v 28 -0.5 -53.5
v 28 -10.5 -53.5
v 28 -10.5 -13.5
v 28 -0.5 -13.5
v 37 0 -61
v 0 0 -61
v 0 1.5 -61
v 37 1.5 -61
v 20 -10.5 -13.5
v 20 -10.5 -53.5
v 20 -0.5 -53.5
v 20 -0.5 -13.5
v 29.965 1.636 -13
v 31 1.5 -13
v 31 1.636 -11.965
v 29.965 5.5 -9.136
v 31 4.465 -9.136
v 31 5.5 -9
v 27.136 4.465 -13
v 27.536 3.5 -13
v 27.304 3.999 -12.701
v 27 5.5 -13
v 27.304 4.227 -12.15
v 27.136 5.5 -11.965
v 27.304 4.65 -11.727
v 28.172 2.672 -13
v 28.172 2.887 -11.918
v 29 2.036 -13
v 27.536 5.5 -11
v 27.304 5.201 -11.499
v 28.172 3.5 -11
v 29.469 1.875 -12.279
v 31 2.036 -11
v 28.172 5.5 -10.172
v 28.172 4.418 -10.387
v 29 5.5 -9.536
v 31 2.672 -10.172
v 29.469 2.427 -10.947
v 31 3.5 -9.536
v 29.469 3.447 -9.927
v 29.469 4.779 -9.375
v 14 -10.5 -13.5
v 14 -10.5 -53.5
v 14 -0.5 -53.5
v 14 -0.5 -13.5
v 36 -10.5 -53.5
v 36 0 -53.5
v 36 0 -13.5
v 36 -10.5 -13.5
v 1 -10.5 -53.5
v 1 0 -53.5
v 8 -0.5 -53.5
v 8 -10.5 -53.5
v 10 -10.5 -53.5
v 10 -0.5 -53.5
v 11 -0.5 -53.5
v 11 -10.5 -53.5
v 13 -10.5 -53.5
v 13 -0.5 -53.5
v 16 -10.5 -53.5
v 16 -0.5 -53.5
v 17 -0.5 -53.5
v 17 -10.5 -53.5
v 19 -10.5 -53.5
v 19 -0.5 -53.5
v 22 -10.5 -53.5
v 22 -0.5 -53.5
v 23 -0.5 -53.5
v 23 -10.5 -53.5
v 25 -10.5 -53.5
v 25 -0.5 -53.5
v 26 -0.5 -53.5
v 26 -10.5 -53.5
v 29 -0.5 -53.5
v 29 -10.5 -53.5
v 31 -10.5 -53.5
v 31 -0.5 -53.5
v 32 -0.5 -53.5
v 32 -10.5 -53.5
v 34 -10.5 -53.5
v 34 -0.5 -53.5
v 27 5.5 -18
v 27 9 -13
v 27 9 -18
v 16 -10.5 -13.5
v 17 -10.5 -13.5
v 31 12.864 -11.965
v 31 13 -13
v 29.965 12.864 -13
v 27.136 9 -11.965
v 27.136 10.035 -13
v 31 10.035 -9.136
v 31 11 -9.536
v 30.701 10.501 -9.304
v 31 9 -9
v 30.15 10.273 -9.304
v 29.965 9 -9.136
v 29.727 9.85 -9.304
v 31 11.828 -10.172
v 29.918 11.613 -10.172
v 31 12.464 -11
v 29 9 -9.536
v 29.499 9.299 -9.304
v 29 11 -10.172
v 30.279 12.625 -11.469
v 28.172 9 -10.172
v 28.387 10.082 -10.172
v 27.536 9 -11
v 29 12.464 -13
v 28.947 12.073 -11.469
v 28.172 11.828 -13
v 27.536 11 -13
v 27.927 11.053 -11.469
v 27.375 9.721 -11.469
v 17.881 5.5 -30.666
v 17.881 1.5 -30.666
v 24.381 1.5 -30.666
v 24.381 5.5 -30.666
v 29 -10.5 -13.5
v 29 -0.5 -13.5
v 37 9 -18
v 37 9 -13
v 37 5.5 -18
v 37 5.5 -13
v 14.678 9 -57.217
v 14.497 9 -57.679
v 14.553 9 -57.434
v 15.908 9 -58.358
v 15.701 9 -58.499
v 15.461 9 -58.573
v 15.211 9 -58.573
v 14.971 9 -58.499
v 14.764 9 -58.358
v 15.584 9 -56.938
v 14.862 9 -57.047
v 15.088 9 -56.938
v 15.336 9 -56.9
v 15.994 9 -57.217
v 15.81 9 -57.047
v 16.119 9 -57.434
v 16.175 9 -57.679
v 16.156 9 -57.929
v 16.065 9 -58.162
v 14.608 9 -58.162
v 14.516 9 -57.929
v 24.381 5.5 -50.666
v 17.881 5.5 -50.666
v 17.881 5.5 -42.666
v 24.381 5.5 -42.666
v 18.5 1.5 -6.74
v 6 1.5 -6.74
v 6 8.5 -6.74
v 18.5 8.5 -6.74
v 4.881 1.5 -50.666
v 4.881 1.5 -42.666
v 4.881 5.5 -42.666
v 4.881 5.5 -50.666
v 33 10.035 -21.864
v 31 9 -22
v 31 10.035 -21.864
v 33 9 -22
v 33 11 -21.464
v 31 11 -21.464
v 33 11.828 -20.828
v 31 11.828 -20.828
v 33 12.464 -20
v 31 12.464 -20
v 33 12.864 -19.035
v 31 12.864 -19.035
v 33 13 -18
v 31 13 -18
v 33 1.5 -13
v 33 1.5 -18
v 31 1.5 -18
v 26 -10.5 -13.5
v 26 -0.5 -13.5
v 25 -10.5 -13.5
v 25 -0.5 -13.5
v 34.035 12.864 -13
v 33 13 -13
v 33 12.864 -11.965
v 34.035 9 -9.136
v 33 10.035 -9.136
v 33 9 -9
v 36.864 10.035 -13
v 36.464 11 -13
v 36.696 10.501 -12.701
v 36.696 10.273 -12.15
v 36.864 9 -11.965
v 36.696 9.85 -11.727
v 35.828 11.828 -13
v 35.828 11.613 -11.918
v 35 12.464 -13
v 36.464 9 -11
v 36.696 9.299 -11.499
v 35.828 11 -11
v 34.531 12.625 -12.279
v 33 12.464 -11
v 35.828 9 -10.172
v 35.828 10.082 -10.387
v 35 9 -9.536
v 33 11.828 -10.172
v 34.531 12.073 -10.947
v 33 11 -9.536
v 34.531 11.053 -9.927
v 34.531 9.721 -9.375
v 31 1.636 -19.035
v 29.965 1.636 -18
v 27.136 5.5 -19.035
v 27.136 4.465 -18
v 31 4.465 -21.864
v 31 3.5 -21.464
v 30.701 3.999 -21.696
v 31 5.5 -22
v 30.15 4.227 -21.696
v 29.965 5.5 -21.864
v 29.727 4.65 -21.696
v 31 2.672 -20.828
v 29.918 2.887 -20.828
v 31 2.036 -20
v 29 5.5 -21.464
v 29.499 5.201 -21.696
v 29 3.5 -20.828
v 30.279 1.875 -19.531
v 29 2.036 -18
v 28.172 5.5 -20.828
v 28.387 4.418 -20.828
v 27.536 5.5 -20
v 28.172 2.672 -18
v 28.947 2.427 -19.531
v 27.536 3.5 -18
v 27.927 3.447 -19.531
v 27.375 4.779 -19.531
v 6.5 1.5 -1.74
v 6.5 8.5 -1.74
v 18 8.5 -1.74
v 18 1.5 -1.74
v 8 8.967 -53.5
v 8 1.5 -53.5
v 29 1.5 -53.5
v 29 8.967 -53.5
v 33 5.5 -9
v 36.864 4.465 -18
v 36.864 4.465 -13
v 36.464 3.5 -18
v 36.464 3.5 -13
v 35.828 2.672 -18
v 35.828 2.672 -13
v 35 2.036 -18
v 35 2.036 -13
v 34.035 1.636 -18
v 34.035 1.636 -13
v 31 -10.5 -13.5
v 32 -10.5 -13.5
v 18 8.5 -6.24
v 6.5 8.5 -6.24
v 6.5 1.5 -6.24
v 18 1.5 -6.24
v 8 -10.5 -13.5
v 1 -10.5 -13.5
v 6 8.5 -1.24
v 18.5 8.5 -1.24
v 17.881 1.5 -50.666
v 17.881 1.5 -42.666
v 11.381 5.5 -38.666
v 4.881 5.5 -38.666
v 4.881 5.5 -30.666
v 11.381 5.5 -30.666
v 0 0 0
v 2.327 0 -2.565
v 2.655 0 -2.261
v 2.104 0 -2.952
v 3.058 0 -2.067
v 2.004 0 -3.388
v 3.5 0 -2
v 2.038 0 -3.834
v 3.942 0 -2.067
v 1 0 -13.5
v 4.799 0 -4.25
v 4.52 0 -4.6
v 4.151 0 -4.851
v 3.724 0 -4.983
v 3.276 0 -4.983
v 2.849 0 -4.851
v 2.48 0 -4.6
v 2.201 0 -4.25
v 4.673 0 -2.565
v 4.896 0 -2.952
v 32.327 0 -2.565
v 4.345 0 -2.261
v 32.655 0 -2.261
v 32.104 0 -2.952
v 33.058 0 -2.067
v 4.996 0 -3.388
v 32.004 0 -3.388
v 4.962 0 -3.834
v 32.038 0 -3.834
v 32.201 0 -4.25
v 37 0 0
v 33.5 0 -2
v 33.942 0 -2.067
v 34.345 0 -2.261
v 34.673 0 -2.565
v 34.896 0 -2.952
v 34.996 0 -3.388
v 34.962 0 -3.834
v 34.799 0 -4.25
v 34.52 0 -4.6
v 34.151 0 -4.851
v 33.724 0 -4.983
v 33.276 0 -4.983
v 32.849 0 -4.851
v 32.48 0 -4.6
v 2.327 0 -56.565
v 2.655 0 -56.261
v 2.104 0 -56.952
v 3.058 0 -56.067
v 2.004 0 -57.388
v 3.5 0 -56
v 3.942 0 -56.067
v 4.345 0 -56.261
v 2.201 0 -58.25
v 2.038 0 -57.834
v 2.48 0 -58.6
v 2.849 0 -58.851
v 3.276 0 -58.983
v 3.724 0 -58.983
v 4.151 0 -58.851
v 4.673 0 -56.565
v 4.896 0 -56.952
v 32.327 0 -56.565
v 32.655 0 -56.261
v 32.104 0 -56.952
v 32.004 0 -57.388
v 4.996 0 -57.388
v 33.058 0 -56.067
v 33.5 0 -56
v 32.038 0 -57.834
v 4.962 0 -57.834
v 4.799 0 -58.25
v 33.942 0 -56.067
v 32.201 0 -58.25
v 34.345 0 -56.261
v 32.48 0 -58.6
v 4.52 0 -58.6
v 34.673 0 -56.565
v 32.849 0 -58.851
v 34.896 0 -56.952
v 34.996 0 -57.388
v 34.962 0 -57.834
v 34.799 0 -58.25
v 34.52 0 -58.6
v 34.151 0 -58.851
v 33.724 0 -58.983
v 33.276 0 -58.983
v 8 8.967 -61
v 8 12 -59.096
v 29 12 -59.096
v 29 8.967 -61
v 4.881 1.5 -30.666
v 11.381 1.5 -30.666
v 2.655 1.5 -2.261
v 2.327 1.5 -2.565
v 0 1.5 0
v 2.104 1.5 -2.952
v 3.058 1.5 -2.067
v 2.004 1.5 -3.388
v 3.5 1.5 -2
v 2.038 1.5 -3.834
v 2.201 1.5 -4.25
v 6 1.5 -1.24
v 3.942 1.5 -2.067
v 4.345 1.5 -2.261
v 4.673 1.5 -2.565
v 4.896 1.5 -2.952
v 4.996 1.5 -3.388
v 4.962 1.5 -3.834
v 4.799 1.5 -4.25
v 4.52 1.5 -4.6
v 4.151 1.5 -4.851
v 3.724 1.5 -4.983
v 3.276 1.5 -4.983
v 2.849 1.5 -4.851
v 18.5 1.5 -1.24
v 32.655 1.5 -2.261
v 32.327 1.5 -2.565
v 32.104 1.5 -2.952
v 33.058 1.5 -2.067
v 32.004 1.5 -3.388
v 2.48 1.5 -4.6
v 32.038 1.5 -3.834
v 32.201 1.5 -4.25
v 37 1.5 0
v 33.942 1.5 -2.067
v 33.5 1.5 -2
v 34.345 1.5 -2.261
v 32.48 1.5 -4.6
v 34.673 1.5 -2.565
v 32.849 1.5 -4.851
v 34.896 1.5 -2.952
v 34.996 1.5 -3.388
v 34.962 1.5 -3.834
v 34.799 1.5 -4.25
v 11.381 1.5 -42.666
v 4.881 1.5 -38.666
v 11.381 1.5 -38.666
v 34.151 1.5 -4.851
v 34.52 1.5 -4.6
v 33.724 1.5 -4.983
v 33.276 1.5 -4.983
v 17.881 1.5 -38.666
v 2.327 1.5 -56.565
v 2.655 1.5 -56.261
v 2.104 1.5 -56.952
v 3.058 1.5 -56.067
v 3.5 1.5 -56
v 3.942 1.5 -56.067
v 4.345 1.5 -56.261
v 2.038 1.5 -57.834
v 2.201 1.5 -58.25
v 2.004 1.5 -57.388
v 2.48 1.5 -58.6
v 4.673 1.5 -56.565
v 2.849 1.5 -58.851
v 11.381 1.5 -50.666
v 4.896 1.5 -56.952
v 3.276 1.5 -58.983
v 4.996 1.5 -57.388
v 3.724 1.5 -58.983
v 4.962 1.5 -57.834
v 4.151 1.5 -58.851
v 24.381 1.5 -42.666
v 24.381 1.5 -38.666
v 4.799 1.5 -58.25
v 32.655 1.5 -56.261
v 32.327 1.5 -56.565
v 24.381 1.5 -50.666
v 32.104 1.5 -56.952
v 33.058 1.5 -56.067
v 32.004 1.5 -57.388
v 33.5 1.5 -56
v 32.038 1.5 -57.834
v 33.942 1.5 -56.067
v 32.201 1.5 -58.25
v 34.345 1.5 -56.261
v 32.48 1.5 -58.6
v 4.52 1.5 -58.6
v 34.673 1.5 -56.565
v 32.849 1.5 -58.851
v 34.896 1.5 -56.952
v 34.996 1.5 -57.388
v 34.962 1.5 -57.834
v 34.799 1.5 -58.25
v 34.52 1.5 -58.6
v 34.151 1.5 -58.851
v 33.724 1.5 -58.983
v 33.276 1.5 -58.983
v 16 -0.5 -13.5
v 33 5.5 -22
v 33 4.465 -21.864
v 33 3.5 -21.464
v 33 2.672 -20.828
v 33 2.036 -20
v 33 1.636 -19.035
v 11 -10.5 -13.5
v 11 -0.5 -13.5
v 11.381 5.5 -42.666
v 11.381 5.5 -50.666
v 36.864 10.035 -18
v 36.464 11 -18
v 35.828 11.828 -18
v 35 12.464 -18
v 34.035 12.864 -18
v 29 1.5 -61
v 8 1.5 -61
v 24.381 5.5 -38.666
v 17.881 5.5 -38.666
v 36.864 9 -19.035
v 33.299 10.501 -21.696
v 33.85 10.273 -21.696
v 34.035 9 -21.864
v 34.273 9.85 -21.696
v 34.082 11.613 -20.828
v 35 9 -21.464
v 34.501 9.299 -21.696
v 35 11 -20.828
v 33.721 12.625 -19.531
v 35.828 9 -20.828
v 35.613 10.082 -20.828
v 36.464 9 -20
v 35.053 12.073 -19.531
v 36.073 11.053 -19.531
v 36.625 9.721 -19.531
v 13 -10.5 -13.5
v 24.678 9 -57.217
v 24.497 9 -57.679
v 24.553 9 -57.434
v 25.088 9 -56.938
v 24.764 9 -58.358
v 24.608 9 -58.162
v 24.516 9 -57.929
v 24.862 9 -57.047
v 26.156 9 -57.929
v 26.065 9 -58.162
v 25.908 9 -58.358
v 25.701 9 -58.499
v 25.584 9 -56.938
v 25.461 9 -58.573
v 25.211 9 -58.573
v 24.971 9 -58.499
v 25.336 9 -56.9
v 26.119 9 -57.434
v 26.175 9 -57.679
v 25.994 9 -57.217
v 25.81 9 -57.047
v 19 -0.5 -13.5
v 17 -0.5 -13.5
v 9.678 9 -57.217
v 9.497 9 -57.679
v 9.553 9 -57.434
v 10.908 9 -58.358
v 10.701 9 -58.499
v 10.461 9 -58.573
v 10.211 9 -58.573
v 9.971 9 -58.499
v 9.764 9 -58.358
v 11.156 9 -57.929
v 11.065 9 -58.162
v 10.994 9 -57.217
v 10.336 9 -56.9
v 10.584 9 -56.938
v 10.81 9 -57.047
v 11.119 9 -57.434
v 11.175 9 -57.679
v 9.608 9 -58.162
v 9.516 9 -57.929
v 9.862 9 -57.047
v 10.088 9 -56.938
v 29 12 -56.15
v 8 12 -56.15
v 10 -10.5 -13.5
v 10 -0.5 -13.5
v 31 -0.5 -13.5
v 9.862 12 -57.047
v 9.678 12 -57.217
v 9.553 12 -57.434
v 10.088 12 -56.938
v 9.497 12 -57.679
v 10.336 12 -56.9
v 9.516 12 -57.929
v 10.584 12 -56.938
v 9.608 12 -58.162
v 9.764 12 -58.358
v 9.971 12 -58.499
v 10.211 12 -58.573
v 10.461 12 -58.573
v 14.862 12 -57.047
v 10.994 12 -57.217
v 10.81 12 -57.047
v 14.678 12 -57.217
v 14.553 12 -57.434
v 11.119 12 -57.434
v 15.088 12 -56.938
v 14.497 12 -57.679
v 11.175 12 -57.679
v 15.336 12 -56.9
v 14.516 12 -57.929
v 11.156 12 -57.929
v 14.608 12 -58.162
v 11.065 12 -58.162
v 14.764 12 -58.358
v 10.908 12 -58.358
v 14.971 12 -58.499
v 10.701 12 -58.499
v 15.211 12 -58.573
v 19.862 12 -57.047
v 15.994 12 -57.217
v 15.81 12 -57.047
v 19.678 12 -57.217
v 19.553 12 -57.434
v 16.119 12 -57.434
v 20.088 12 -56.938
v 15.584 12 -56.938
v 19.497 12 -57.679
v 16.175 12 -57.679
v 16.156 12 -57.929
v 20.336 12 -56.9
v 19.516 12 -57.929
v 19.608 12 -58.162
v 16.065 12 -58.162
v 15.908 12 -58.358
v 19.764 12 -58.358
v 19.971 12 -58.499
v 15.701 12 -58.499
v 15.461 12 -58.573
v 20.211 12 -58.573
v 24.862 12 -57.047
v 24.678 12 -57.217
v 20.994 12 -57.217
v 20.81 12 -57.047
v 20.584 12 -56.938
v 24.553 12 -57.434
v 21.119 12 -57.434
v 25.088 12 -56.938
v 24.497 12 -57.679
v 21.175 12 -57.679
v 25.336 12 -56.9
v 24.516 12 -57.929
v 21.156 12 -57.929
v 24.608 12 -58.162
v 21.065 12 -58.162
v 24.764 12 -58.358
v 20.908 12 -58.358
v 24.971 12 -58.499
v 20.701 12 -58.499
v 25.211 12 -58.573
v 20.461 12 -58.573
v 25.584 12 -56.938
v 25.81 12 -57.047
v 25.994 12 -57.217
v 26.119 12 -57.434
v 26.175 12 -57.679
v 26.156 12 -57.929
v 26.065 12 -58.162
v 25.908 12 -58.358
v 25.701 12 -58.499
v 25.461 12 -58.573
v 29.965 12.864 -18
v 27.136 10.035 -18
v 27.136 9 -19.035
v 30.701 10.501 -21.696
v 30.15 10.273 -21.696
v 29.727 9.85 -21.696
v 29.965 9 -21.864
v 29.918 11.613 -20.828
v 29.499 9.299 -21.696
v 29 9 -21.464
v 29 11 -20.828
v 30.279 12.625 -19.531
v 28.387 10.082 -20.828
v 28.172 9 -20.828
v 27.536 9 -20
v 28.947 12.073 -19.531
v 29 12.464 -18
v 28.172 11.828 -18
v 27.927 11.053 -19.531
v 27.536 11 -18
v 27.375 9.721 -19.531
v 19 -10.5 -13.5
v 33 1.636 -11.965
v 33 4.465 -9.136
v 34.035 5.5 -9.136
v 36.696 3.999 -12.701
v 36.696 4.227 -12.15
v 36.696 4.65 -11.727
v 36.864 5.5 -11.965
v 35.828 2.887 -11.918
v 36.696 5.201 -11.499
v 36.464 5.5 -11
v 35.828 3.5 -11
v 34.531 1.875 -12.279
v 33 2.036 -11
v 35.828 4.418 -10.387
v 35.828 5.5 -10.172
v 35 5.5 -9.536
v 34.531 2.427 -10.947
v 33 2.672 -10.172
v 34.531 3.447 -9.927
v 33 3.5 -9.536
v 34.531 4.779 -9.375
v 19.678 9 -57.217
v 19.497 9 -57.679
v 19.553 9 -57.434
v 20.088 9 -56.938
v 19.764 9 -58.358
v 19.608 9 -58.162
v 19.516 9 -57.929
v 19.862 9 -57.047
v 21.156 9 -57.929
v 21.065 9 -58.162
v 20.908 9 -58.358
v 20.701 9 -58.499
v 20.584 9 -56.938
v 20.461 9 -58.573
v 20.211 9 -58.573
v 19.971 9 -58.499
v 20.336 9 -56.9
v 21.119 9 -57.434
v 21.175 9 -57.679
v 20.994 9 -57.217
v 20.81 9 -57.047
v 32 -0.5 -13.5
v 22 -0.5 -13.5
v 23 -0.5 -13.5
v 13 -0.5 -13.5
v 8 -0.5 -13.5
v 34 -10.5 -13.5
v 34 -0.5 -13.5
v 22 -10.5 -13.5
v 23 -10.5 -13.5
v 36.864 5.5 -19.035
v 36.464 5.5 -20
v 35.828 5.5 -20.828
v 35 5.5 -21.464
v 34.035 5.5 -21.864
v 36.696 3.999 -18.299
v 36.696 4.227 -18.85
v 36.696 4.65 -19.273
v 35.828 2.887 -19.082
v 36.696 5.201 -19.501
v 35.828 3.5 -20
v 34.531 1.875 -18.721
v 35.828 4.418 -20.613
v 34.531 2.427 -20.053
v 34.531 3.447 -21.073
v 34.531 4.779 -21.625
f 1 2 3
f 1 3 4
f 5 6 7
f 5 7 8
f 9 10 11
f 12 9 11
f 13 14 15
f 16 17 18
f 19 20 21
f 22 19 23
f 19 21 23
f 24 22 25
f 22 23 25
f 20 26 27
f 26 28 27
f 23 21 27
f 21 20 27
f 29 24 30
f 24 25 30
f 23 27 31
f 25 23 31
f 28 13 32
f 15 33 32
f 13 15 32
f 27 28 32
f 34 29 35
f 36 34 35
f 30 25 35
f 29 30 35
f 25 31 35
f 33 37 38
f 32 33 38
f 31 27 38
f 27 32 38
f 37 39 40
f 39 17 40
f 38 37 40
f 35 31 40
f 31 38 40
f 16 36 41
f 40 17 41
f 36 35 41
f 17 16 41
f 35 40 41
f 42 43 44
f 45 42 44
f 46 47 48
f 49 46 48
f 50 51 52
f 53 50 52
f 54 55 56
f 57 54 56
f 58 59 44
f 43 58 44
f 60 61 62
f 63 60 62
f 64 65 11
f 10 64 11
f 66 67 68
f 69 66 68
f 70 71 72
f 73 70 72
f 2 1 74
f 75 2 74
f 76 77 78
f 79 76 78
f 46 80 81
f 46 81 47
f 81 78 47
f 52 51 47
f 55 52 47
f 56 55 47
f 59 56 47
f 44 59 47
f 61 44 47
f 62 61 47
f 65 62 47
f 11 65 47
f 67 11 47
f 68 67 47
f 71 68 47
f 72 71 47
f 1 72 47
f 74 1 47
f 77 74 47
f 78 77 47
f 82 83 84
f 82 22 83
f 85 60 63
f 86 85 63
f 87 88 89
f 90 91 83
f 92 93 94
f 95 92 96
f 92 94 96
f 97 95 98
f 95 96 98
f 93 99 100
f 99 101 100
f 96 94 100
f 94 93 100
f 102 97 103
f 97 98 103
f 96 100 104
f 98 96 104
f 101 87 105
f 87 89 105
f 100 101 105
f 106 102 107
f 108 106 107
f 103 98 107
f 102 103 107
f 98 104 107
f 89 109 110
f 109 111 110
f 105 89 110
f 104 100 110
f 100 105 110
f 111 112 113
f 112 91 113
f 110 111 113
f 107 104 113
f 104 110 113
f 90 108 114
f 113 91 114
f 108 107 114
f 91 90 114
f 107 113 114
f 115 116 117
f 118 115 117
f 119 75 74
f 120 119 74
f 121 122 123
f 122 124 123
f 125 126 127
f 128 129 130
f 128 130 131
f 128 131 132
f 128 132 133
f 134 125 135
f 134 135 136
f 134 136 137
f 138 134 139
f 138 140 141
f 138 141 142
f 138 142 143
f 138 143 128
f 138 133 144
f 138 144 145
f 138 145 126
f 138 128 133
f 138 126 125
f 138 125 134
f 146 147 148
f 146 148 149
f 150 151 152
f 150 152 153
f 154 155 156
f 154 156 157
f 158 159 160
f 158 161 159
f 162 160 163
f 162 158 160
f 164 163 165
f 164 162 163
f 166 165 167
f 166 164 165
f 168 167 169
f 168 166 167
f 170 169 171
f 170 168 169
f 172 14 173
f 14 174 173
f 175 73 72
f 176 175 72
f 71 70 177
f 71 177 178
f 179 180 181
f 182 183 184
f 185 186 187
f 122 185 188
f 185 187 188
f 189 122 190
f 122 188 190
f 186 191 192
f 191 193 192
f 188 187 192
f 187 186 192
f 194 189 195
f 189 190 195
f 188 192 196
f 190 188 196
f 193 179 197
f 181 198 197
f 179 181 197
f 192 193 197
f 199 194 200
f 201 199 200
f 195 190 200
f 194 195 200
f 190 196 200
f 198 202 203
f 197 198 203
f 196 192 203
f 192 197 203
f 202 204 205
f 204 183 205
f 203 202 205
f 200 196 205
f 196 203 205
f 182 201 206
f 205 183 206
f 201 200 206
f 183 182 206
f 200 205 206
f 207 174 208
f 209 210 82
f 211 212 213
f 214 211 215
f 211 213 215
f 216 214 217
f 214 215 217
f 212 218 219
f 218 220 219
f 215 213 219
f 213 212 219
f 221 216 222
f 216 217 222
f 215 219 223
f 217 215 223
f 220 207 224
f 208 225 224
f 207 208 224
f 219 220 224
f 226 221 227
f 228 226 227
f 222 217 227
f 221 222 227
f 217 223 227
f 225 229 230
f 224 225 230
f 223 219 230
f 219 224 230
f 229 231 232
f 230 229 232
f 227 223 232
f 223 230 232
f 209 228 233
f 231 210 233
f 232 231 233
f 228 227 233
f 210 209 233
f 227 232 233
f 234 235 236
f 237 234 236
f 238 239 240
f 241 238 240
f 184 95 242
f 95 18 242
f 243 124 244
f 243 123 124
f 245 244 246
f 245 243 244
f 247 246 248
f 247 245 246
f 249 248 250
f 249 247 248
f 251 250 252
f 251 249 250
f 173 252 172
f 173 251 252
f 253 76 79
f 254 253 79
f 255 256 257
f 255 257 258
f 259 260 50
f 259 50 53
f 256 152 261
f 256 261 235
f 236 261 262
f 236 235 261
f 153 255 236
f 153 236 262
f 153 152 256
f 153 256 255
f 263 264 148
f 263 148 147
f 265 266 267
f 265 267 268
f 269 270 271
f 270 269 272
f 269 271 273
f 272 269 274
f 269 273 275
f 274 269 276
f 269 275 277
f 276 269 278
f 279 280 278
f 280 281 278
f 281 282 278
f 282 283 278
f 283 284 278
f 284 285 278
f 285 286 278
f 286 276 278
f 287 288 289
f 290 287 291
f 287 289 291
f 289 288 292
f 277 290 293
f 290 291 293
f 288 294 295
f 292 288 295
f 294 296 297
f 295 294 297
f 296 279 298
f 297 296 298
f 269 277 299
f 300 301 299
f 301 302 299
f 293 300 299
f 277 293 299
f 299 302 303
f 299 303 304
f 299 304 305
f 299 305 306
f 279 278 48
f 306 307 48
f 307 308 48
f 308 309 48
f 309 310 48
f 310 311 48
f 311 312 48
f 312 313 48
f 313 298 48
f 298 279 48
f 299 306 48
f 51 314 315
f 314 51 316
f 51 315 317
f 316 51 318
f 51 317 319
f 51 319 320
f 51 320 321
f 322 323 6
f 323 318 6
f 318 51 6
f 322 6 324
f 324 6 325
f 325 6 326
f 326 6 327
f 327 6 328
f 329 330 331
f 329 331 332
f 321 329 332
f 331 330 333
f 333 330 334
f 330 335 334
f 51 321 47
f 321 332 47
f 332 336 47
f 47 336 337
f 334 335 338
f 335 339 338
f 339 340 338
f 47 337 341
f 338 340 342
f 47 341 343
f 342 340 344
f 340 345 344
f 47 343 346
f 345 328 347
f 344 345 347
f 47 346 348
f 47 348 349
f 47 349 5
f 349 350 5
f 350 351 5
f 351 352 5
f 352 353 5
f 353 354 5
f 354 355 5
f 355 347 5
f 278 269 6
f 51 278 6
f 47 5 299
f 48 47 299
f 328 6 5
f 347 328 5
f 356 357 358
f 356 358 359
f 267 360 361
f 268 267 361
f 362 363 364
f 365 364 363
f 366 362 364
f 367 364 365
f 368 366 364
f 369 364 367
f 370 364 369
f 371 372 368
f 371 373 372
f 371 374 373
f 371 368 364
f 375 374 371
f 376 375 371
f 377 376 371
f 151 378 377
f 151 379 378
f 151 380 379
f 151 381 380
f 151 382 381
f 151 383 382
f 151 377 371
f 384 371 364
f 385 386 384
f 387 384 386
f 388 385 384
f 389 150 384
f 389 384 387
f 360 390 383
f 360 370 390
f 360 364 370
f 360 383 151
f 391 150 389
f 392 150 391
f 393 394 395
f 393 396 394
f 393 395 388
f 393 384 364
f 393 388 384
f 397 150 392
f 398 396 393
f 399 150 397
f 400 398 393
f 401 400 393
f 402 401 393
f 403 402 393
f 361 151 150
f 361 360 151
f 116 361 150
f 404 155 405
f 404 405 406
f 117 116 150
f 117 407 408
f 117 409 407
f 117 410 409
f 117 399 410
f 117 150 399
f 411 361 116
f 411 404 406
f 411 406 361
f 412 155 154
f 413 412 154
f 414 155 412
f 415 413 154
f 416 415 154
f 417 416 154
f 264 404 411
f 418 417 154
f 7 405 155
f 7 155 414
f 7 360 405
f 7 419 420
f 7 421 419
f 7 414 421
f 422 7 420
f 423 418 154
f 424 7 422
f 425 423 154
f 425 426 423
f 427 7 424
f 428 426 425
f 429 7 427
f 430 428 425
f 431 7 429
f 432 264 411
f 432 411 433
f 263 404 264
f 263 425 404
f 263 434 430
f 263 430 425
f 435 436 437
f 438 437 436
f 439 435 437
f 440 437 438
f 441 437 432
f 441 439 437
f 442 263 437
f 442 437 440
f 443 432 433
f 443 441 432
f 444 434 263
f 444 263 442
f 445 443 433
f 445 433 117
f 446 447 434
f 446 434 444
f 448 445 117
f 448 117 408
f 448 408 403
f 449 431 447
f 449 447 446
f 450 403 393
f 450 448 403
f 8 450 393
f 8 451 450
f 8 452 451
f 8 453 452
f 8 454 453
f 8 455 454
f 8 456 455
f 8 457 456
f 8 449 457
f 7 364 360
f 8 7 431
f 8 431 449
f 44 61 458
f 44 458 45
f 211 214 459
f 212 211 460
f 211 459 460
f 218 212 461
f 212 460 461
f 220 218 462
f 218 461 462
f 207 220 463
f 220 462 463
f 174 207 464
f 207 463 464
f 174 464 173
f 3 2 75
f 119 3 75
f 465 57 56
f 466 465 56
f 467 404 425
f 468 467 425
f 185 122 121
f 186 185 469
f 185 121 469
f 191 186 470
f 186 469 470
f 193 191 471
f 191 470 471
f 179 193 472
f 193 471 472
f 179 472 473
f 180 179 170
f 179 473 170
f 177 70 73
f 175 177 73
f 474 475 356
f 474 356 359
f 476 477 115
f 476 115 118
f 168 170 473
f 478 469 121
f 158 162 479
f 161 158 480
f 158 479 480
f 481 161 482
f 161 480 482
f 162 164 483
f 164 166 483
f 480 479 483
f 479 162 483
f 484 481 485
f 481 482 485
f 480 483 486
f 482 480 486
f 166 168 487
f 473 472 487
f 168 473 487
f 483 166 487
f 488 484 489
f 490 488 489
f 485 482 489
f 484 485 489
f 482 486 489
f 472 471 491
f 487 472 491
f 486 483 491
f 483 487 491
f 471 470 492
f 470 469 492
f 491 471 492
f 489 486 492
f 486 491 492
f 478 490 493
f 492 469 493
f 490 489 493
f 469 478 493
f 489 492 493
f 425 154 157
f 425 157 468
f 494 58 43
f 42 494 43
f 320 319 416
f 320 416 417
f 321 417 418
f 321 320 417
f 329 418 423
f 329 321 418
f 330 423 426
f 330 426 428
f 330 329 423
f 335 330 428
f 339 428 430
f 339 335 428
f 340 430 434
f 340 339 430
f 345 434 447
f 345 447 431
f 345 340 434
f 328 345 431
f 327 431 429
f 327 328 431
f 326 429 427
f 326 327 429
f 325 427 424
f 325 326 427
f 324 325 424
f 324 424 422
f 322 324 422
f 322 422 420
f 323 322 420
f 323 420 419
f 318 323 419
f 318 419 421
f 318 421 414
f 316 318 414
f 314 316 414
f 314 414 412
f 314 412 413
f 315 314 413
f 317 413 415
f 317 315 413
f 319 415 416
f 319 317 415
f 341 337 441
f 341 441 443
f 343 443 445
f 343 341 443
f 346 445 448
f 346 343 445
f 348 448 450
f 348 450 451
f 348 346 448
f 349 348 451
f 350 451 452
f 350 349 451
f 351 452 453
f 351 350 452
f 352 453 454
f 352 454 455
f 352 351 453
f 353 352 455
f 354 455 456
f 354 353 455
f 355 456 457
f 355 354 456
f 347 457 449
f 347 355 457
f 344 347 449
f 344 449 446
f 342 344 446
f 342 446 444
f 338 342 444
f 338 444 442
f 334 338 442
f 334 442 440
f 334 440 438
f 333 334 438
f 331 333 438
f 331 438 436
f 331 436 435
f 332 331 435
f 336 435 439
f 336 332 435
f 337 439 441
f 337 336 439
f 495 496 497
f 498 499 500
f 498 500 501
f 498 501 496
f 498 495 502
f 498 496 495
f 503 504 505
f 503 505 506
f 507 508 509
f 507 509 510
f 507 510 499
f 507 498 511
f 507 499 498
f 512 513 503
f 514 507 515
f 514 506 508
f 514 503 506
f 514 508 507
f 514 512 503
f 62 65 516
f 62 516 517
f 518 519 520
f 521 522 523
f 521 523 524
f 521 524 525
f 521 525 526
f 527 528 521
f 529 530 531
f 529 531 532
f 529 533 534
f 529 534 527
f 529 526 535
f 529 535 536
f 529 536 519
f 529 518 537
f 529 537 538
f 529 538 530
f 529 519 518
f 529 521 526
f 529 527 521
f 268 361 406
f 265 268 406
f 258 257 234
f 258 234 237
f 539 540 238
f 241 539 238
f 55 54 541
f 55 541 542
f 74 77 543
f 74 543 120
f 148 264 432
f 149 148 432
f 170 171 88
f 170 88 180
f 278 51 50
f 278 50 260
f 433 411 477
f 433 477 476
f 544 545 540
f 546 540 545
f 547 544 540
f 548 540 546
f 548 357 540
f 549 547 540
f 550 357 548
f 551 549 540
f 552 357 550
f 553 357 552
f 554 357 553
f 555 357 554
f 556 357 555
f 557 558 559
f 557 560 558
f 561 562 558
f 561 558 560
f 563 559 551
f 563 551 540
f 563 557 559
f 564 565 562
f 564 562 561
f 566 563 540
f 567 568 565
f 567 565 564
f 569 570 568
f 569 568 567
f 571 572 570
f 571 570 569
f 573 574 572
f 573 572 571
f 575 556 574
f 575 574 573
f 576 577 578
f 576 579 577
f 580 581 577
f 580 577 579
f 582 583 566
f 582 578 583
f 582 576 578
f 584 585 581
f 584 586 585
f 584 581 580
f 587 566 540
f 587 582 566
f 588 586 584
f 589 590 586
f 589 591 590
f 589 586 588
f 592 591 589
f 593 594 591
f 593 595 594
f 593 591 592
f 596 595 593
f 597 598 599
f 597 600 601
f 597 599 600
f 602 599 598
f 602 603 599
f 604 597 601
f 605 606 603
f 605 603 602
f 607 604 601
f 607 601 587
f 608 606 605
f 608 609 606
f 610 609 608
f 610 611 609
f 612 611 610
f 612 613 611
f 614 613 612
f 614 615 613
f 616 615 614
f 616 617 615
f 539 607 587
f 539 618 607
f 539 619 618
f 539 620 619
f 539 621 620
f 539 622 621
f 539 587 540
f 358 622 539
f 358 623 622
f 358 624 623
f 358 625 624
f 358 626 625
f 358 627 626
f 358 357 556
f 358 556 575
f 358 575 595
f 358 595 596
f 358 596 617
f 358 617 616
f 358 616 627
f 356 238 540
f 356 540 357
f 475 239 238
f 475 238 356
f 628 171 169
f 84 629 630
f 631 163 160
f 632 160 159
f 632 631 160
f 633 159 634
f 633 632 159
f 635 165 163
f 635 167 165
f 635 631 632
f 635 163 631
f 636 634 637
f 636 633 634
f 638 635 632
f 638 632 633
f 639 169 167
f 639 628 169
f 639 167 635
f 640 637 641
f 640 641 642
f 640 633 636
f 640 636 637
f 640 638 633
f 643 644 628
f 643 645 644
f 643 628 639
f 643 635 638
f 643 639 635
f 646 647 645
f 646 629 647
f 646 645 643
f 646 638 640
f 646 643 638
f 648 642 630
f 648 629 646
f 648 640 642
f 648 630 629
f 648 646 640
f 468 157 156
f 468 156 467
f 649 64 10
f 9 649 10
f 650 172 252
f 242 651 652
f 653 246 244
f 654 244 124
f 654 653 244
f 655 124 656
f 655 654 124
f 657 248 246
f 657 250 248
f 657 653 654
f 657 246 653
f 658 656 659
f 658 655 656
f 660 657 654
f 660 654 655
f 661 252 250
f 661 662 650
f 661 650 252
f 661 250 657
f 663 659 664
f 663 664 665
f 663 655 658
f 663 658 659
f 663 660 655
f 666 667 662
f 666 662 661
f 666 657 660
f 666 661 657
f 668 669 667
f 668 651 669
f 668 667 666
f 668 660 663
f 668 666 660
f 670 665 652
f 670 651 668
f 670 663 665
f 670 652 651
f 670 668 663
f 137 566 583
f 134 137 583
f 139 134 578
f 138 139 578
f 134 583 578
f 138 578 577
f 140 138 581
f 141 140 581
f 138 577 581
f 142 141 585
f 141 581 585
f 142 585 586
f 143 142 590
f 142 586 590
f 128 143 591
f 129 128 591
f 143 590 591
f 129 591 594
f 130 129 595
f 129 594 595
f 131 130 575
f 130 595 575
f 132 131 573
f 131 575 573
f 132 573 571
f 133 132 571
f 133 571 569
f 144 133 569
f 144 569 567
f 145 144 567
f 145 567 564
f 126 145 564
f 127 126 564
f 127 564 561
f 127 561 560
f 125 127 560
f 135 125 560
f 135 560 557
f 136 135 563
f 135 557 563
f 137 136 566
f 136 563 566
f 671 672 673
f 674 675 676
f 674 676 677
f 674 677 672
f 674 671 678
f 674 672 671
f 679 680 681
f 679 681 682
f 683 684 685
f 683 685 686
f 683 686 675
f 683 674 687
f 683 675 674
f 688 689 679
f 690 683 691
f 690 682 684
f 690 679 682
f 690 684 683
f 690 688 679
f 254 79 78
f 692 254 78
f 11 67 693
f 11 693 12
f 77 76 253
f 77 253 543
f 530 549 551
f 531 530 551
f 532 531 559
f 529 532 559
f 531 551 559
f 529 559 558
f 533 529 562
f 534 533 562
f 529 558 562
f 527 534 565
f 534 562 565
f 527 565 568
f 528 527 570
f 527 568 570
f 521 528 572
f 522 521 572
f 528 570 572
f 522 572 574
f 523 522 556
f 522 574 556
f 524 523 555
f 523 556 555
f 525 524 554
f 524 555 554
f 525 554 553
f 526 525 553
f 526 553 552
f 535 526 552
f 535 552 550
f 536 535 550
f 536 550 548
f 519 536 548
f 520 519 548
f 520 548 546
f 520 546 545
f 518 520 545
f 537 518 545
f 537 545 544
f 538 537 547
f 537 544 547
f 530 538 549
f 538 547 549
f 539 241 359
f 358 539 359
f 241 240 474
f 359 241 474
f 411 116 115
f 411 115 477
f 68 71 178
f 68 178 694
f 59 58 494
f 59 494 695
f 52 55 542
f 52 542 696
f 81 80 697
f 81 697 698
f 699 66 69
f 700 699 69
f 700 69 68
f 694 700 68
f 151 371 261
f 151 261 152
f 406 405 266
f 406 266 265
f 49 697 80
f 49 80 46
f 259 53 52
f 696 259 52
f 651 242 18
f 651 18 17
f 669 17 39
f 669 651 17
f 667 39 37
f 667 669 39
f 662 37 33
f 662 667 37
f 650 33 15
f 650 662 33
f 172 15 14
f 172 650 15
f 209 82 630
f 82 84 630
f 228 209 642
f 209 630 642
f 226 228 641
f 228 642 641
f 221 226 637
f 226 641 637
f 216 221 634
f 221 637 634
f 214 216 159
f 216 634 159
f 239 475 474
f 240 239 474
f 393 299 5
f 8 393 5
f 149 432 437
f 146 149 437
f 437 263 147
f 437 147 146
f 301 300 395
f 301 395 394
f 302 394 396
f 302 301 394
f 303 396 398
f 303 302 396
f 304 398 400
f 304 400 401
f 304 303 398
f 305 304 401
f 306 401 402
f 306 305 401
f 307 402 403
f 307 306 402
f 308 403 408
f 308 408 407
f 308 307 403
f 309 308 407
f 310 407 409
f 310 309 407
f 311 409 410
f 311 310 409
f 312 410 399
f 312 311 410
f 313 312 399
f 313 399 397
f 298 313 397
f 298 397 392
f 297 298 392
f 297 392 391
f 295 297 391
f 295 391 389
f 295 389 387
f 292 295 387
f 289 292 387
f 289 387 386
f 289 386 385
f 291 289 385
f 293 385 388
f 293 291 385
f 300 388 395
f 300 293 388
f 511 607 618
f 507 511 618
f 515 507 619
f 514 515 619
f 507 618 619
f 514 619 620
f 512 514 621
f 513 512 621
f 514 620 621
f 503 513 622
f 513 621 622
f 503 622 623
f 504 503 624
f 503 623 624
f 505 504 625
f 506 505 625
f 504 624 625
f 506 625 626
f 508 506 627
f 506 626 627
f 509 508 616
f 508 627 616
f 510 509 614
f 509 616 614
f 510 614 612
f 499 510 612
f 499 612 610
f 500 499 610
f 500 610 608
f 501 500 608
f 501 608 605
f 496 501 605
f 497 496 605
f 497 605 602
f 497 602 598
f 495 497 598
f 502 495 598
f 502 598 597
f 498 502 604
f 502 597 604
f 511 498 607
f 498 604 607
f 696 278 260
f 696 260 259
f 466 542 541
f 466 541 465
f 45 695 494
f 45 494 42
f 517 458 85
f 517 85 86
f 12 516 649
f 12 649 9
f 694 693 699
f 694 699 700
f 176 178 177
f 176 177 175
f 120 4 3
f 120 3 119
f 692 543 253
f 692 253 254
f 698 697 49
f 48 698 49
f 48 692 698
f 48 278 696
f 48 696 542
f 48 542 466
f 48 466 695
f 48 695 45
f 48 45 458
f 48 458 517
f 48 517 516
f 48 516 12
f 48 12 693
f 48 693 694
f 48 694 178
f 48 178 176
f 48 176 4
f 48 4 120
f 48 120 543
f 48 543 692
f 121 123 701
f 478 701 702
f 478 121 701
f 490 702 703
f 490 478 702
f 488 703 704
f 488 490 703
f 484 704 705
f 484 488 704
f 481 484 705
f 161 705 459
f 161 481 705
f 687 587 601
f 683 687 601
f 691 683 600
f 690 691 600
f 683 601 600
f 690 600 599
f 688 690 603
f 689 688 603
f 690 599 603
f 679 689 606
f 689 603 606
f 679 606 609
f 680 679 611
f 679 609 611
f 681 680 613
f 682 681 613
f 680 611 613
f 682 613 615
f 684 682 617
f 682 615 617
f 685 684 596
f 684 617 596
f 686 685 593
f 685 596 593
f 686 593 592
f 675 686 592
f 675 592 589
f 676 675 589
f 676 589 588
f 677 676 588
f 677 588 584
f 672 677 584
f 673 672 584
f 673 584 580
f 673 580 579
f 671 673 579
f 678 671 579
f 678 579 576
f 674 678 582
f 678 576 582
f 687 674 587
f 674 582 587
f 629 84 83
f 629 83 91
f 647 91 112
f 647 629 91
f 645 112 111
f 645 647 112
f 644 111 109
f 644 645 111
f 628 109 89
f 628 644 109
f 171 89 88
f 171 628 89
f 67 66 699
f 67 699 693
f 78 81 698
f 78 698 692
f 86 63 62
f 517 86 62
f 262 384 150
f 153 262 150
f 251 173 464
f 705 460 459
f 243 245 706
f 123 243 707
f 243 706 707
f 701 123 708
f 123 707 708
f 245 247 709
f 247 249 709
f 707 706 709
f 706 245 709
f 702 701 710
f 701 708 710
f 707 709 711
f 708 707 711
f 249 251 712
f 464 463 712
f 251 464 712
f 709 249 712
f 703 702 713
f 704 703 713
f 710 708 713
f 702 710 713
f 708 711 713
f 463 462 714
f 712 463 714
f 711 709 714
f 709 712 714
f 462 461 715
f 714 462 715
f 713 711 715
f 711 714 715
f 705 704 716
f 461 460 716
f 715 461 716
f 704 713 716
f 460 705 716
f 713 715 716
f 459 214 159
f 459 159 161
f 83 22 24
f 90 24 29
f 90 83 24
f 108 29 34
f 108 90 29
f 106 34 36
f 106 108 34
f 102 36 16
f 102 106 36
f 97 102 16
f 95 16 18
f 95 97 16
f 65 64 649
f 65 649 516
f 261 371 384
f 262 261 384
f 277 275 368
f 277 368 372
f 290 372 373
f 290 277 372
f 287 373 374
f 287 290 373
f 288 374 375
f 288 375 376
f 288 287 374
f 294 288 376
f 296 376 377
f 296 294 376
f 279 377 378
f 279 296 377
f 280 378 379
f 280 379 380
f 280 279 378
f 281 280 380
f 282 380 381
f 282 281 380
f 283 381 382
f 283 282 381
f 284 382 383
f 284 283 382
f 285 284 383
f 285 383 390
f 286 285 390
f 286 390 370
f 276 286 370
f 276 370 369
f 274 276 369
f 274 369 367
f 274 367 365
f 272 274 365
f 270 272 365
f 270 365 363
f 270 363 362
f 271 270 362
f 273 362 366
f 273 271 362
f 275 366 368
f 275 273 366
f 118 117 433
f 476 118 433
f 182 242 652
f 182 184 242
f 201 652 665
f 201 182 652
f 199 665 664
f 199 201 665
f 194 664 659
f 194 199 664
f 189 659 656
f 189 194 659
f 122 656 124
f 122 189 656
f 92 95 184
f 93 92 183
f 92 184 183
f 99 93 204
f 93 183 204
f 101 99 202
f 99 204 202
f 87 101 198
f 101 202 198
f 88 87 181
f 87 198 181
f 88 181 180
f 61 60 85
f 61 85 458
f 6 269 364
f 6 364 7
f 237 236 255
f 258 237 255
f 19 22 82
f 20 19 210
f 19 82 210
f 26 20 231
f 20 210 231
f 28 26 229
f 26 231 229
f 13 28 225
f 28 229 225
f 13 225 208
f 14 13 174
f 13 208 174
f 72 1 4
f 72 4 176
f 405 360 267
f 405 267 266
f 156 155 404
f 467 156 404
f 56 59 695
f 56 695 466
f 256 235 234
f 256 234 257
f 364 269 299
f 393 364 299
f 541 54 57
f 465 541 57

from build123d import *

# Parameters (mm, degrees)
SKETCH_1_W          = 37
SKETCH_1_H          = 61
SKETCH_1_R          = 1.5
EXTRUDE_1_DEPTH     = 1.5
SKETCH_2_W          = 35
SKETCH_2_H          = 40
EXTRUDE_2_DEPTH     = 10.5
SKETCH_3_W          = 12.5
SKETCH_3_H          = 5.5
EXTRUDE_3_DEPTH     = 7
SKETCH_4_W          = 21
SKETCH_4_H          = 7.5
EXTRUDE_4_DEPTH     = 10.5
SKETCH_5_W          = 10
SKETCH_5_H          = 13
EXTRUDE_5_DEPTH     = 11.5
SKETCH_6_W          = 11.5
SKETCH_6_H          = 4.5
CUT_EXTRUDE_1_DEPTH = 7
CUT_EXTRUDE_3_DEPTH = 21
SKETCH_9_R          = 0.84119958
CUT_EXTRUDE_4_DEPTH = 3
FILLET_2_R          = 4
SKETCH_10_W         = 6.5
SKETCH_10_H         = 8
EXTRUDE_6_DEPTH     = 4
SKETCH_11_W         = 2
SKETCH_11_H         = 10
CUT_EXTRUDE_5_DEPTH = 67.334380226


with BuildPart() as part:
    # 草图1 → 凸台-拉伸1 (new body)
    with BuildSketch(Plane(origin=(0, 0, 0), x_dir=(1, 0, 0), z_dir=(0, 1, 0))):
        with Locations((18.5, 30.5)):
            Rectangle(SKETCH_1_W, SKETCH_1_H)
        with Locations(Location((3.5, 57.5, 0), (0, 0, 270))):
            Circle(SKETCH_1_R, mode=Mode.SUBTRACT)
        with Locations(Location((33.5, 57.5, 0), (0, 0, 270))):
            Circle(SKETCH_1_R, mode=Mode.SUBTRACT)
        with Locations(Location((3.5, 3.5, 0), (0, 0, 270))):
            Circle(SKETCH_1_R, mode=Mode.SUBTRACT)
        with Locations(Location((33.5, 3.5, 0), (0, 0, 270))):
            Circle(SKETCH_1_R, mode=Mode.SUBTRACT)
    extrude(amount=EXTRUDE_1_DEPTH)

    # 草图2 → 凸台-拉伸2 (add)
    with BuildSketch(Plane.XZ):
        with Locations((18.5, -33.5)):
            Rectangle(SKETCH_2_W, SKETCH_2_H)
    extrude(amount=EXTRUDE_2_DEPTH)

    # 草图3 → 凸台-拉伸3 (add)
    with BuildSketch(Plane(origin=(0, 1.5, 0), x_dir=(1, 0, 0), z_dir=(0, 1, 0))):
        with Locations((12.25, 3.989979593)):
            Rectangle(SKETCH_3_W, SKETCH_3_H)
    extrude(amount=EXTRUDE_3_DEPTH)

    # 草图6 → 切除-拉伸1 (cut)
    with BuildSketch(Plane(origin=(0, 8.5, 0), x_dir=(1, 0, 0), z_dir=(0, 1, 0))):
        with Locations((12.25, 3.989979593)):
            Rectangle(SKETCH_6_W, SKETCH_6_H)
    extrude(amount=-CUT_EXTRUDE_1_DEPTH, mode=Mode.SUBTRACT)

    # 草图10 → 凸台-拉伸6 (add)
    with BuildSketch(Plane(origin=(0, 1.5, 0), x_dir=(1, 0, 0), z_dir=(0, 1, 0))):
        with Locations((8.130940151, 46.665513772)):
            Rectangle(SKETCH_10_W, SKETCH_10_H)
        with Locations((8.130940151, 34.665513772)):
            Rectangle(SKETCH_10_W, SKETCH_10_H)
        with Locations((21.130940151, 34.665513772)):
            Rectangle(SKETCH_10_W, SKETCH_10_H)
        with Locations((21.130940151, 46.665513772)):
            Rectangle(SKETCH_10_W, SKETCH_10_H)
    extrude(amount=EXTRUDE_6_DEPTH)

    # 草图11 → 切除-拉伸5 (cut, through all)
    with BuildSketch(Plane(origin=(0, 0, -53.5), x_dir=(-1, 0, 0), z_dir=(0, 0, -1))):
        with Locations((-33, -5.5)):
            Rectangle(SKETCH_11_W, SKETCH_11_H)
        with Locations((-30, -5.5)):
            Rectangle(SKETCH_11_W, SKETCH_11_H)
        with Locations((-27, -5.5)):
            Rectangle(SKETCH_11_W, SKETCH_11_H)
        with Locations((-24, -5.5)):
            Rectangle(SKETCH_11_W, SKETCH_11_H)
        with Locations((-21, -5.5)):
            Rectangle(SKETCH_11_W, SKETCH_11_H)
        with Locations((-18, -5.5)):
            Rectangle(SKETCH_11_W, SKETCH_11_H)
        with Locations((-15, -5.5)):
            Rectangle(SKETCH_11_W, SKETCH_11_H)
        with Locations((-12, -5.5)):
            Rectangle(SKETCH_11_W, SKETCH_11_H)
        with Locations((-9, -5.5)):
            Rectangle(SKETCH_11_W, SKETCH_11_H)
    extrude(amount=-CUT_EXTRUDE_5_DEPTH, mode=Mode.SUBTRACT)


with BuildPart() as body_2:
    # 草图4 → 凸台-拉伸4 (new body)
    with BuildSketch(Plane(origin=(0, 1.5, 0), x_dir=(1, 0, 0), z_dir=(0, 1, 0))):
        with Locations((18.5, 57.25)):
            Rectangle(SKETCH_4_W, SKETCH_4_H)
    extrude(amount=EXTRUDE_4_DEPTH)

    # 草图8 → 切除-拉伸3 (cut)
    with BuildSketch(Plane.ZY.offset(-8)):
        Polygon((-59.096067897, 12), (-61, 8.967458814), (-61, 12), align=None)
        Polygon((-56.149607192, 12), (-53.5, 8.967458814), (-53.5, 12), align=None)
    extrude(amount=-CUT_EXTRUDE_3_DEPTH, mode=Mode.SUBTRACT)

    # 草图9 → 切除-拉伸4 (cut)
    with BuildSketch(Plane(origin=(0, 12, 0), x_dir=(1, 0, 0), z_dir=(0, 1, 0))):
        with Locations(Location((25.336097721, 57.741602474, 0), (0, 0, 270))):
            Circle(SKETCH_9_R)
        with Locations(Location((20.336097721, 57.741602474, 0), (0, 0, 270))):
            Circle(SKETCH_9_R)
        with Locations(Location((15.336097721, 57.741602474, 0), (0, 0, 270))):
            Circle(SKETCH_9_R)
        with Locations(Location((10.336097721, 57.741602474, 0), (0, 0, 270))):
            Circle(SKETCH_9_R)
    extrude(amount=-CUT_EXTRUDE_4_DEPTH, mode=Mode.SUBTRACT)


with BuildPart() as body_3:
    # 草图5 → 凸台-拉伸5 (new body)
    with BuildSketch(Plane(origin=(0, 1.5, 0), x_dir=(1, 0, 0), z_dir=(0, 1, 0))):
        with Locations((32, 15.5)):
            Rectangle(SKETCH_5_W, SKETCH_5_H)
    extrude(amount=EXTRUDE_5_DEPTH)

    # 圆角2
    fillet_2_edges = [body_3.edges().sort_by_distance(p)[0] for p in [
        (27, 13, -15.5),
        (32, 13, -9),
        (37, 13, -15.5),
        (32, 1.5, -9),
        (27, 1.5, -15.5),
        (32, 1.5, -22),
        (37, 1.5, -15.5),
        (32, 13, -22),
        (37, 7.25, -9),
        (27, 7.25, -9),
        (27, 7.25, -22),
        (37, 7.25, -22),
    ]]
    fillet(fillet_2_edges, radius=FILLET_2_R)


solid = Compound([part.part, body_2.part, body_3.part])
